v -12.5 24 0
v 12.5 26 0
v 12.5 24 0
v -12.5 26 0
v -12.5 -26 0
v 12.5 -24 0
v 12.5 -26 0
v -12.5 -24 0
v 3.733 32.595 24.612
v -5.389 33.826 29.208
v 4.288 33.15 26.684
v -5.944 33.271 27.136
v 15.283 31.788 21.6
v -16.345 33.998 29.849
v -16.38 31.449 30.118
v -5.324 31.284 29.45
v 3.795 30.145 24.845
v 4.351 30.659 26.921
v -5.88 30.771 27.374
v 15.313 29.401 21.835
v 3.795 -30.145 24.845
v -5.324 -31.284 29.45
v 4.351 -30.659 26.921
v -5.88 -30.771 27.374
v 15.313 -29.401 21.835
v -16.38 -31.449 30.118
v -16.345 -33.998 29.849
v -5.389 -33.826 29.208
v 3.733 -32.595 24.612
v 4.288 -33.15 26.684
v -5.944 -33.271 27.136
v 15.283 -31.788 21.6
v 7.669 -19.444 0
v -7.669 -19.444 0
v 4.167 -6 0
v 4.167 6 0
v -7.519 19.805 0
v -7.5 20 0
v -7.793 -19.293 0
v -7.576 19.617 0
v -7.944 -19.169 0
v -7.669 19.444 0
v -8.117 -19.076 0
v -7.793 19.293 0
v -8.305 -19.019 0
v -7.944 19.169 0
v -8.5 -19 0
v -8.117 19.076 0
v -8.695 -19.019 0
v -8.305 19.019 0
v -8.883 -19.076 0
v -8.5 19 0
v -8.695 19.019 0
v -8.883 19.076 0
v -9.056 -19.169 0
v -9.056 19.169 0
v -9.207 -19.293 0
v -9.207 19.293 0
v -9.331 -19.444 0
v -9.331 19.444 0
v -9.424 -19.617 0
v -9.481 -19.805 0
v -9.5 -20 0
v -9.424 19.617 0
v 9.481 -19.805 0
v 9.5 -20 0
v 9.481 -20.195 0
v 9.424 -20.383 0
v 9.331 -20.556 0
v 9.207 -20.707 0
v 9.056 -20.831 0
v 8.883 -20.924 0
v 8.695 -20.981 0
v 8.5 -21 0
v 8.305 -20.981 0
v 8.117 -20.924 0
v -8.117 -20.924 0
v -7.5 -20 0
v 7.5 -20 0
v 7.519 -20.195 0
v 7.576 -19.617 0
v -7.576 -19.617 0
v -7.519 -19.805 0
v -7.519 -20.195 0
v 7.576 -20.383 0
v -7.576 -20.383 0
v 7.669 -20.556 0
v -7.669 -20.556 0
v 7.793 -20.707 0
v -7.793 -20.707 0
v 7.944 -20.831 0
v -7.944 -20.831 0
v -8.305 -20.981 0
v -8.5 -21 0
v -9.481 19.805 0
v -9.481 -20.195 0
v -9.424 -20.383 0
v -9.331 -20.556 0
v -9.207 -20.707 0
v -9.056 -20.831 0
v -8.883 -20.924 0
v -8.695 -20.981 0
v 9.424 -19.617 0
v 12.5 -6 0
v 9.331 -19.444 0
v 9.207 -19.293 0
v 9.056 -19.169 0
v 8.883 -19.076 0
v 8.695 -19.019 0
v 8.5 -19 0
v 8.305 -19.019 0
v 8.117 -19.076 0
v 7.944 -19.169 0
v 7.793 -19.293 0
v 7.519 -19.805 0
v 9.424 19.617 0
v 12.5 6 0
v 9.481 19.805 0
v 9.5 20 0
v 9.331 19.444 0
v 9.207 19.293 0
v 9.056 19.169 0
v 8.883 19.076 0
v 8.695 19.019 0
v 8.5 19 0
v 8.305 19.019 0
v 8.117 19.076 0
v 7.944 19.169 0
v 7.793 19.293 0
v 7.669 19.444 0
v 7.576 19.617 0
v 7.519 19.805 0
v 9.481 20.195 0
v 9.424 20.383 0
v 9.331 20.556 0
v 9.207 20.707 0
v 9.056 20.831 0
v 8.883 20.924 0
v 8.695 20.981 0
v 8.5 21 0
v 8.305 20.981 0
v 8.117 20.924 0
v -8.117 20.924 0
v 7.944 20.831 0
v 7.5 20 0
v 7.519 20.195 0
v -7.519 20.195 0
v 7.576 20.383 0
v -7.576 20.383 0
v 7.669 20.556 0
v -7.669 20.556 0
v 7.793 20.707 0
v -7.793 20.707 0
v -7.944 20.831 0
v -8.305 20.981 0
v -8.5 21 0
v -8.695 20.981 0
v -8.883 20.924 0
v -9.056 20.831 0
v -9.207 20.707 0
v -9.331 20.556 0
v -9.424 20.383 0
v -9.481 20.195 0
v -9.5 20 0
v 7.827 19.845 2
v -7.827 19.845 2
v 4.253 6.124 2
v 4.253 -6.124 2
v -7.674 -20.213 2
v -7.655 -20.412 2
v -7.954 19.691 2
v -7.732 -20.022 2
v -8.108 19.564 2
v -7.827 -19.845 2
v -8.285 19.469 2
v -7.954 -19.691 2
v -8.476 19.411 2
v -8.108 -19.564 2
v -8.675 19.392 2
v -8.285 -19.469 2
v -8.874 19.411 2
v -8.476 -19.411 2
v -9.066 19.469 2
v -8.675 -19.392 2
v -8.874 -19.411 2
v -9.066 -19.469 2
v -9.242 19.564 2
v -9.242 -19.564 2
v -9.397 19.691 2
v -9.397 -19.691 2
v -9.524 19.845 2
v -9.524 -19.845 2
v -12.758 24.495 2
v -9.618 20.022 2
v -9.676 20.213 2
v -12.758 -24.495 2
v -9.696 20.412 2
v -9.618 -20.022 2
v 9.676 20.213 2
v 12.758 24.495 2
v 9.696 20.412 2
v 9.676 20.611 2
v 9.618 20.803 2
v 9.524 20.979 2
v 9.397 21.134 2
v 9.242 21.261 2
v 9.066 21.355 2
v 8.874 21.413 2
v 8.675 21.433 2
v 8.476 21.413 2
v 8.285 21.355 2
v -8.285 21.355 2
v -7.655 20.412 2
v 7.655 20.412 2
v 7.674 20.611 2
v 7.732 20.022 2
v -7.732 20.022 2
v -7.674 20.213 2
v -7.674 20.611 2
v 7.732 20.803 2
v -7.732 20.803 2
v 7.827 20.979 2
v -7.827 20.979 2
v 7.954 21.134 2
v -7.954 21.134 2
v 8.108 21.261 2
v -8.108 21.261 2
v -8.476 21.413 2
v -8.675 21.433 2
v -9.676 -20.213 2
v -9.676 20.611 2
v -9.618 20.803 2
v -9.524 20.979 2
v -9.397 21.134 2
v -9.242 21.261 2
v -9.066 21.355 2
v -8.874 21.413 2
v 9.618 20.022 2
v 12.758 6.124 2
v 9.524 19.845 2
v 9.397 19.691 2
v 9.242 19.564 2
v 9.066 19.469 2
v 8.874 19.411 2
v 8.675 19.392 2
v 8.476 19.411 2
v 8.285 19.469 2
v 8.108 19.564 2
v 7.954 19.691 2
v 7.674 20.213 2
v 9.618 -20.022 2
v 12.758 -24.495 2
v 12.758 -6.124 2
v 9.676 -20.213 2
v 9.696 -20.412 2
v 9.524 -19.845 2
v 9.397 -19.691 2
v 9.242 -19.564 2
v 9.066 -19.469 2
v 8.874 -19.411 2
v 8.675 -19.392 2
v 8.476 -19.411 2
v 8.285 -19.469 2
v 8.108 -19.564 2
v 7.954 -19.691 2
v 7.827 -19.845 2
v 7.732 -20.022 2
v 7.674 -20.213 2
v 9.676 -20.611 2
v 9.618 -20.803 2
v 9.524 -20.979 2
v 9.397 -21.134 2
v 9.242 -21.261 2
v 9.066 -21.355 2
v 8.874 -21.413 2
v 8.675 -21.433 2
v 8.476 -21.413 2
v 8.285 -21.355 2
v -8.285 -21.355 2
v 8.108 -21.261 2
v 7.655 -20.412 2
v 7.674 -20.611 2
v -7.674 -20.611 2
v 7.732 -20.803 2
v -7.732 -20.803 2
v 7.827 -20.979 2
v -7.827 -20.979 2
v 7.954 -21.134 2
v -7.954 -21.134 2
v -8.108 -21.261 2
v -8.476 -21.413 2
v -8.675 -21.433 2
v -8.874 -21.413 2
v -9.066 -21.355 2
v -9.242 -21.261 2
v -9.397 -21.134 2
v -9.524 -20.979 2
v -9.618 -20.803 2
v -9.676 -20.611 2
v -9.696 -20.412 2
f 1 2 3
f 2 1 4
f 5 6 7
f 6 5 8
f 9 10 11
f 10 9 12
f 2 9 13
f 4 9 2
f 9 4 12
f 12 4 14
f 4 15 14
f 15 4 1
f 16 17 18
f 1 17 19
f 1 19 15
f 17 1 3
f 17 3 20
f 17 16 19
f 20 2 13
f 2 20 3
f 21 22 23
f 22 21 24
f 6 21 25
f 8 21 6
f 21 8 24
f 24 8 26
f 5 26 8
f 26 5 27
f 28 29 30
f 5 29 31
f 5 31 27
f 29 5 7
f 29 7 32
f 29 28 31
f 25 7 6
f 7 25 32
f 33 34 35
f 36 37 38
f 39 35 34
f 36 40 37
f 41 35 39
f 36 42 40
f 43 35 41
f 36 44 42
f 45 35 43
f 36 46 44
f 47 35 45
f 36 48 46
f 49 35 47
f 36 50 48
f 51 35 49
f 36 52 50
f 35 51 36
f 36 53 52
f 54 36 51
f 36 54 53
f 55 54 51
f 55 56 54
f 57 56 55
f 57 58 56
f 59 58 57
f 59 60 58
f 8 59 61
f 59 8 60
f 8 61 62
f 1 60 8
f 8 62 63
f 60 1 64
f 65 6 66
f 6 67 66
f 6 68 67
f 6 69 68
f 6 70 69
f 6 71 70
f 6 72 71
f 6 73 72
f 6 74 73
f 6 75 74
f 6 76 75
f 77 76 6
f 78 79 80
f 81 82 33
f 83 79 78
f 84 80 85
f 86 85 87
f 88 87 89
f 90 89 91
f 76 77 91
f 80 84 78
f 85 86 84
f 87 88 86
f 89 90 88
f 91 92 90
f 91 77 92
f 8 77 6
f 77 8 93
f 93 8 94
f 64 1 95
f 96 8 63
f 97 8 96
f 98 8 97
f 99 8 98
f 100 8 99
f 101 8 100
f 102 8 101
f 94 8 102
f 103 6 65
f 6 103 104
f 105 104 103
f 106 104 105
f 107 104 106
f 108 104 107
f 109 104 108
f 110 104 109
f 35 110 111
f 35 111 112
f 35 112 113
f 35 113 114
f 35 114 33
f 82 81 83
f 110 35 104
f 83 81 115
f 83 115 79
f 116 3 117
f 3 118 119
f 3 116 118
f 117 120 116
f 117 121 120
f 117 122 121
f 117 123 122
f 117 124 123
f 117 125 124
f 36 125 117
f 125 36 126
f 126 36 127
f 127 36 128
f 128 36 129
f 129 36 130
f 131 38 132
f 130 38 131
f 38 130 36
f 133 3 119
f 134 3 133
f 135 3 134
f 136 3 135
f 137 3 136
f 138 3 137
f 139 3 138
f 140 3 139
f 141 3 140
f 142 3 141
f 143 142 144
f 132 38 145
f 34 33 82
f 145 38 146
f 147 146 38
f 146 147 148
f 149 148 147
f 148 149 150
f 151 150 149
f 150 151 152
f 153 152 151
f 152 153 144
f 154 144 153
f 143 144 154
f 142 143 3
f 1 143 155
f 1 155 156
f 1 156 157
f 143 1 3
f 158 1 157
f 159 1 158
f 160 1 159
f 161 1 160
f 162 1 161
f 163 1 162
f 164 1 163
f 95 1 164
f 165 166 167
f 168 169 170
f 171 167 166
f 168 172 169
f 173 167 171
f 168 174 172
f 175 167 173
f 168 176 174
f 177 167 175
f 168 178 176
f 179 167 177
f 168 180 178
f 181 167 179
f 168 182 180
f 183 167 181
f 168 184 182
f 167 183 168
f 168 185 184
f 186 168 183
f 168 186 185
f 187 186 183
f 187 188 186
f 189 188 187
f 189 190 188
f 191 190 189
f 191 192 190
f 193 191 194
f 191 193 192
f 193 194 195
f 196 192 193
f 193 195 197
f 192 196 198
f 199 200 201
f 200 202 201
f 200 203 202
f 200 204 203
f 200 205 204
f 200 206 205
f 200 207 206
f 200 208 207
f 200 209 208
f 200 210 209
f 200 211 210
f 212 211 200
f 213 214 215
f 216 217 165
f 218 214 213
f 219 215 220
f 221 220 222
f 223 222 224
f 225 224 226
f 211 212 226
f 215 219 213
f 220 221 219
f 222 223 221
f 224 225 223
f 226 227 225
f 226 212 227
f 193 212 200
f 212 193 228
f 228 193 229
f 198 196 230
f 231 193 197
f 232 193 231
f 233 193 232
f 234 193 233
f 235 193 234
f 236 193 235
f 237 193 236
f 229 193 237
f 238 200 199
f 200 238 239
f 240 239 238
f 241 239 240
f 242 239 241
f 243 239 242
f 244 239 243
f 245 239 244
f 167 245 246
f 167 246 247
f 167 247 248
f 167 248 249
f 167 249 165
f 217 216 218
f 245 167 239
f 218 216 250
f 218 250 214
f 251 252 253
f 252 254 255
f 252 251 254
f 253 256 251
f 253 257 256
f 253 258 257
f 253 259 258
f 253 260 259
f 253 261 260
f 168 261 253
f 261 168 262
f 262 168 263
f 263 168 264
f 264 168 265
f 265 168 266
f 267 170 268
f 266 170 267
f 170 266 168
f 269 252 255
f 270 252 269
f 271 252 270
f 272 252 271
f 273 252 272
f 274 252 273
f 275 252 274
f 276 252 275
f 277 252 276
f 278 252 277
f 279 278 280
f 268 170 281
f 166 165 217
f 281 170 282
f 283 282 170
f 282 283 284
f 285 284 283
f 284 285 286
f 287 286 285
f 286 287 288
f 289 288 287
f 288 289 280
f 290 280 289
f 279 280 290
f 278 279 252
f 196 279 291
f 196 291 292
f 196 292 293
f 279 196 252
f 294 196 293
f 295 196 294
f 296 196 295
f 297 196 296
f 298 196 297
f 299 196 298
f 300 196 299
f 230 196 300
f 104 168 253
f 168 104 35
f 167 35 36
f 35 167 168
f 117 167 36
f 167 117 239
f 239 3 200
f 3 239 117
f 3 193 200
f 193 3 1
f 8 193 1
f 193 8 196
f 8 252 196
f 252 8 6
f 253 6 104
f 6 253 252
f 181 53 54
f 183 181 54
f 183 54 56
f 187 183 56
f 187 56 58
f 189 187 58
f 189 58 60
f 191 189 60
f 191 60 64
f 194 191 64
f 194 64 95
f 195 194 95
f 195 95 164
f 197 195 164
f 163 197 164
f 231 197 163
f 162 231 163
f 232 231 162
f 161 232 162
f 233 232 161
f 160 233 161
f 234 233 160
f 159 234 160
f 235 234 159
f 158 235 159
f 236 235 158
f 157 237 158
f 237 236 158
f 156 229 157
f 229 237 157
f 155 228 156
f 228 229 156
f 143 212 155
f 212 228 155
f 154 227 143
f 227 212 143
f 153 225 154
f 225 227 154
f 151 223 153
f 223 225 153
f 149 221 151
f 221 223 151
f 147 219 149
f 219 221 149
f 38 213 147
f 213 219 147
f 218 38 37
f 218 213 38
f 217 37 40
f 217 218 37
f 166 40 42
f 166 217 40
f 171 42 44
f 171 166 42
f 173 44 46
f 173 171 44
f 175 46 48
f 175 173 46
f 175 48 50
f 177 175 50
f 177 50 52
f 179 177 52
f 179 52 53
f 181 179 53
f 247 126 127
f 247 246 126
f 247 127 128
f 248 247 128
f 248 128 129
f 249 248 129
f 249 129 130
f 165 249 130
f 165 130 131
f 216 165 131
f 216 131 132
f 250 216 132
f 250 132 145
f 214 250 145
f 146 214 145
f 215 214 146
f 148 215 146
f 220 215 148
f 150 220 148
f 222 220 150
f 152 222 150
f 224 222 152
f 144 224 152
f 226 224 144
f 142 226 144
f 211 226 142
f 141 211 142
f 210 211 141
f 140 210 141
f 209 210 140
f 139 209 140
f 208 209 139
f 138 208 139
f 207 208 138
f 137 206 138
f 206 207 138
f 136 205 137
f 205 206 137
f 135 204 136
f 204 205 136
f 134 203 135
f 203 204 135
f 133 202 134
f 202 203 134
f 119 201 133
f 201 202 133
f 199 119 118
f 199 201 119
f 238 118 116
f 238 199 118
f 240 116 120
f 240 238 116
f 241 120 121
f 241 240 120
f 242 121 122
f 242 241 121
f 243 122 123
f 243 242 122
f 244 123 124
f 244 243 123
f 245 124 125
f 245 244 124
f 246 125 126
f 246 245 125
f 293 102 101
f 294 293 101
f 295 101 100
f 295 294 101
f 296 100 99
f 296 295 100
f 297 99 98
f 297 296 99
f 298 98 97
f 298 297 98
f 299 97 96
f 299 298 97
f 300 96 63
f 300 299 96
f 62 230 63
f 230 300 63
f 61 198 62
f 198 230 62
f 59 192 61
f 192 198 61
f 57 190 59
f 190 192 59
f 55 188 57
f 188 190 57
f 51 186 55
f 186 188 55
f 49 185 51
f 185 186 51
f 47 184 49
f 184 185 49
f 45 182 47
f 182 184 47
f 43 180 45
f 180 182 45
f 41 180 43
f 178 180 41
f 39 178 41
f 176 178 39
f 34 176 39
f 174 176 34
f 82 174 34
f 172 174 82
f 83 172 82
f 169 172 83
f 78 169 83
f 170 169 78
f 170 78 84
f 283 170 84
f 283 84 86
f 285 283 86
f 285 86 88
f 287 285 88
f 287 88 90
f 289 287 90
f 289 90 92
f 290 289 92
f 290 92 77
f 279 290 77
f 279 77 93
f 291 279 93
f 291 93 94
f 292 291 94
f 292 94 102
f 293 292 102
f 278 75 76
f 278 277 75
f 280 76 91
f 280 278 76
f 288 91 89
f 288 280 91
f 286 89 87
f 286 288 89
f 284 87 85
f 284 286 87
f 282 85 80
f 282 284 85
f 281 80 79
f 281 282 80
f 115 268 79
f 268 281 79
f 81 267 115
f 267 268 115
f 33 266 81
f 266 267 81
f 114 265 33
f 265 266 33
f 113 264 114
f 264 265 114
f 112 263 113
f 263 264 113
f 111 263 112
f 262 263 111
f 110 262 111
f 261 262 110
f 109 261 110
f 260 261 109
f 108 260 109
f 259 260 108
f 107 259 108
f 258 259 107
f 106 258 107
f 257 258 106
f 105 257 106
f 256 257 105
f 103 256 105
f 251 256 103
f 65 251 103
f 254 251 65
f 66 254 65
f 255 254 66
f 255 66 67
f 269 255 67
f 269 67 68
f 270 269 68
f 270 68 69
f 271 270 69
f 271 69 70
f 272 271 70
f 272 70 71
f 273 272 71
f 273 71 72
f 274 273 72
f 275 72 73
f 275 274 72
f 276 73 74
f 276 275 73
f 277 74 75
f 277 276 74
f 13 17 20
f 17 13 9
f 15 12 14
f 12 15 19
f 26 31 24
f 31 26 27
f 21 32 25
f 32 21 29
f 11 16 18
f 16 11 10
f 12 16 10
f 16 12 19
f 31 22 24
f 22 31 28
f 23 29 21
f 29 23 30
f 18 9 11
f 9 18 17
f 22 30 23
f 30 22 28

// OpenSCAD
// file: oem/generic/lib.scad
$fn = 32;

kEpsilon = 1e-1;

function property(table, key) = table[search([key], table)[0]][1];

module sector(radius, angles, fn = $fn) {
     r = radius / cos(180 / fn);
     step = -360 / fn;

     points = concat([[0, 0]],
                     [for(a = [angles[0] : step : angles[1] - 360])
                               [r * cos(a), r * sin(a)]
                          ],
                     [[r * cos(angles[1]), r * sin(angles[1])]]
          );

     difference() {
          circle(radius, $fn = fn);
          polygon(points);
     }
}

module ring(inner_radius, outer_radius, angles = [0, 360], fn = $fn) {
     difference() {
          sector(radius=outer_radius, angles=angles, fn=fn);
          sector(radius=inner_radius, angles=angles+[-kEpsilon, kEpsilon], fn=fn);
     }
}

module rounded_ring(inner_radius, outer_radius, angles = [0, 360], fn = $fn) {
     step_angle = 360 / fn;
     ring_width = outer_radius - inner_radius;
     ring_mean_radius = (outer_radius + inner_radius) / 2;
     for (theta = angles) {
          theta_d = theta / step_angle;
          theta_frac = (theta_d - floor(theta_d) - 0.5) * step_angle;
          rho = ring_mean_radius * cos(step_angle/2) / cos(theta_frac);
          rotate(theta)
          translate([rho, 0])
          circle(d=ring_width);
     }
     ring(inner_radius=inner_radius,
          outer_radius=outer_radius,
          angles=angles, fn=fn);
}

module fillet(r) {
     difference() {
          difference() {
               offset(r=-r - kEpsilon)
                    offset(delta=r) {
                    children();
               }
               offset(r=r)
                    offset(delta=-r) {
                    children();
               }
          }
          children();
     }
     offset(r=r)
          offset(delta=-r) {
          children();
     }
}

module bench_fillet(r, order=1000) {
     difference() {
          fillet(r) {
               translate([-order/2-kEpsilon, 0]) {
                    square([order, order], center=true);
               }
               children();
          }
          translate([-order/2-kEpsilon, 0]) {
               square([order+kEpsilon, order+kEpsilon], center=true);
          }
     }
}

module curved_bench_fillet(r, bench_radius, order=1000, internal=true) {
     difference() {
          fillet(r) {
               if (internal) {
                    translate([bench_radius, 0]) {
                         ring(inner_radius=bench_radius + kEpsilon, outer_radius=bench_radius * order);
                    }
               } else {
                    translate([-bench_radius, 0]) circle(r=bench_radius - kEpsilon);
               }
               children();
          }
          if (internal) {
               translate([bench_radius, 0]) {
                    ring(inner_radius=bench_radius,
                         outer_radius=bench_radius * order - kEpsilon);
               }
          } else {
               translate([-bench_radius, 0]) circle(r=bench_radius);
          }

     }
}


module window(side, position=[0, 0, 0], order=1000) {
    difference() {
        children();
        translate(position)  {
            difference() {
                square(order, center=true);
                square(side, center=true);
            }
        }
    }
}


module rounded_cylinder(diameter, height, fillet_radius, center) {
     translate([0, 0, ! center ? height/2 : 0]) {
          minkowski() {
               cylinder(d=(diameter - 2 * fillet_radius),
                        h=(height - 2 * fillet_radius),
                        center=true);
               sphere(r=fillet_radius);
          }
     }
}


module curved_support_xsection(support_radius, fillet_radius,
                               wall_inner_radius, wall_outer_radius,
                               hole_radius = 0, internal=true) {
     support_angular_width = (4 * support_radius / wall_outer_radius) * 180 / PI;
     wall_thickness = wall_outer_radius - wall_inner_radius;
     rotate([0, 0, internal ? 180 : 0]) {
          difference() {
               window(6*support_radius) {
                    curved_bench_fillet(fillet_radius, bench_radius=wall_inner_radius, internal=internal) {
                         hull() {
                              translate([support_radius + wall_thickness/2, 0]) {
                                   circle(r=support_radius);
                              }
                              rotate([0, 0, ! internal ? 180 : 0])
                              translate([wall_inner_radius + wall_thickness/2, 0]) {
                                   ring(inner_radius=wall_inner_radius,
                                        outer_radius=wall_outer_radius,
                                        angles=[180 - support_angular_width/2,
                                                180 + support_angular_width/2]);
                              }
                         }
                         rotate([0, 0, ! internal ? 180 : 0])
                         translate([wall_inner_radius + wall_thickness/2, 0]) {
                              ring(inner_radius=wall_inner_radius,
                                   outer_radius=wall_outer_radius,
                                   angles=[180 - support_angular_width,
                                           180 + support_angular_width]);
                         }
                    }
               }
               if (hole_radius > 0) {
                    translate([support_radius + wall_thickness/2, 0]) {
                         circle(r=hole_radius);
                    }
               }
          }
     }
}

module fill(upto=1000) {
     offset(delta=-upto) {
          offset(delta=upto) {
               children();
          }
     }
}

module outline(delta) {
     if (delta > 0) {
          difference() {
               offset(delta=delta) {
                    children();
               }
               children();
          }
     } else {
          difference() {
               children();
               offset(delta=delta) {
                    children();
               }
          }
     }
}

module duplicate(v) {
     children();
     mirror(v) children();
}

function steps(start, end, n) = [start:(end - start)/(n - 1):end];

function sigmoid(x) = 1.0 / (1.0 + exp(-x));

module sigmoid_profile(length, width, order=10, fn = $fn) {
     step = length / fn;
     points = concat(
          [[0, 0]],
          [for (x = [step:step:length-step]) [x, width * sigmoid(2 * order * ((x / length) - 0.5))]],
          [[length, width], [0, width]]

     );
     polygon(points=points);
}

module exp_nerve_xsection(height, length, decay_rate = 5, fn = $fn) {
     step = length / fn;
     points = concat(
          [[0, 0]],
          [for (x = [0:step:length-step]) [x, height * exp(-x/decay_rate)]],
          [[length, 0]]
          );
     polygon(points=points);
}

module exp_nerve(height, length, thickness, decay_rate = 3, fn = $fn) {
     rotate([90, 0, 0])
     linear_extrude(height=thickness, center=true) {
          exp_nerve_xsection(height, length, decay_rate, fn);
     }
}

module exp_corner_nerve(height, radius, angles, corner_radius = 0, decay_rate = 3, fn = $fn) {
     difference() {
          rotate_extrude() {
               if (corner_radius > 0) {
                    translate([corner_radius, 0, 0])
                    exp_nerve_xsection(height=height, length=radius, decay_rate=decay_rate, fn=fn);
               } else {
                    translate([-corner_radius, 0, 0])
                    mirror([1, 0, 0])
                    exp_nerve_xsection(height=height, length=radius, decay_rate=decay_rate, fn=fn);
               }
          }
          linear_extrude(height=2 * height, center=true) {
               sector(radius=radius + abs(corner_radius), angles=[angles[1], angles[0] + 360], fn=fn);
          }
     }
}
// file: chassis_base.scad
include <generic/lib.scad>;

function vChassisBaseDatasheet() =
     let(outer_diameter=400, thickness=2, inner_diameter=outer_diameter - 2 * thickness,
         base_height=108, height=130, inner_height=height - 2 * thickness)
     [["outer_diameter", outer_diameter], ["inner_diameter", inner_diameter],
      ["base_height", base_height], ["height", height], ["inner_height", inner_height],
      ["thickness", thickness], ["support_diameter", 10], ["z_offset", 20], ["fillet_radius", 4]];

module mChassisOuterVolume() {
     datasheet = vChassisBaseDatasheet();
     rounded_cylinder(diameter=property(datasheet, "outer_diameter"),
                      height=property(datasheet, "height"),
                      fillet_radius=property(datasheet, "fillet_radius"));
}

module mChassisInnerVolume() {
     datasheet = vChassisBaseDatasheet();
     translate([0, 0, property(datasheet, "thickness")]) {
          rounded_cylinder(diameter=property(datasheet, "inner_diameter"),
                           height=property(datasheet, "inner_height"),
                           fillet_radius=property(datasheet, "fillet_radius"));
     }
}

module mChassisBBox() {
     datasheet = vChassisBaseDatasheet();
     chassis_height = property(datasheet, "height");
     chassis_outer_diameter = property(datasheet, "outer_diameter");
     translate([0., 0., chassis_height/2]) {
          cube([chassis_outer_diameter, chassis_outer_diameter, chassis_height], center=true);
     }
}

module mChassisShell() {
     difference() {
          mChassisOuterVolume();
          mChassisInnerVolume();
     }
}

module mChassisVolumeConstrain() {
     datasheet = vChassisBaseDatasheet();
     height = property(datasheet, "height");
     outer_diameter = property(datasheet, "outer_diameter");
     fillet_radius = property(datasheet, "fillet_radius");
     difference() {
          rounded_cylinder(diameter=outer_diameter,
                           height=height,
                           fillet_radius=fillet_radius);
          difference() {
               translate([0, 0, -kEpsilon]) {
                    rounded_cylinder(diameter=outer_diameter + kEpsilon,
                                     height=height + 2 * kEpsilon,
                                     fillet_radius=fillet_radius);
               }
               children();
          }
     }
}
// file: oem/hcs04_sonar.scad
include <generic/lib.scad>;

function vHCS04SonarDatasheet() =
     [["horizontal_fov", 30], ["range", 4000], ["width", 43],
      ["length", 20], ["height", 15], ["hole_to_hole_width", 40],
      ["hole_to_hole_length", 17], ["hole_diameter", 2]];

module mHCS04SonarFrustum() {
     datasheet = vHCS04SonarDatasheet();
     sonar_length = property(datasheet, "length");
     sonar_width = property(datasheet, "width");
     sonar_range = property(datasheet, "range");
     sonar_horizontal_fov = property(datasheet, "horizontal_fov");
     linear_extrude(height=sonar_range, scale=(2 * sonar_range * tan(sonar_horizontal_fov/2) + sonar_width)/sonar_width) {
          square([sonar_length, sonar_width], center=true);
     }
}

module mHCS04Sonar() {
     rotate([0, 0, 90]) import("stl/HC-SR04.stl");
}

mHCS04Sonar();
// main file
include <generic/lib.scad>;

use <oem/hcs04_sonar.scad>;

use <chassis_base.scad>;

kHCS04SonarDatasheet = vHCS04SonarDatasheet();
kChassisBaseDatasheet = vChassisBaseDatasheet();

function vHCS04SonarBracketDatasheet() =
     [["width", property(kHCS04SonarDatasheet, "width") + 5],
      ["length", property(kHCS04SonarDatasheet, "length") + 5],
      ["connector_width", 12], ["pin_width", 10],
      ["thickness", 2], ["mounting_polar_angle", 75],
      ["distance_to_wall", 2 * property(kHCS04SonarDatasheet, "height")]];


module mHCS04SonarBracket() {
     datasheet = vHCS04SonarBracketDatasheet();
     width = property(datasheet, "width");
     pin_width = property(datasheet, "pin_width");
     length = property(datasheet, "length");
     thickness = property(datasheet, "thickness");
     mounting_polar_angle = property(datasheet, "mounting_polar_angle");
     distance_to_wall = property(datasheet, "distance_to_wall");
     sonar_horizontal_fov = property(kHCS04SonarDatasheet, "horizontal_fov");
     sonar_hole_to_hole_width = property(kHCS04SonarDatasheet, "hole_to_hole_width");
     sonar_hole_to_hole_length = property(kHCS04SonarDatasheet, "hole_to_hole_length");
     sonar_hole_diameter = property(kHCS04SonarDatasheet, "hole_diameter");
     render(convexity = 10) {
          rotate([0, -mounting_polar_angle, 0])
          difference() {
               rotate([0, mounting_polar_angle, 0]) {
                    let(extrusion_scale=(4 * distance_to_wall * tan(sonar_horizontal_fov/2) + width  + 2 * thickness)/(width + 2 * thickness)) {
                         linear_extrude(height=2 * distance_to_wall, scale=extrusion_scale) {
                              difference() {
                                   square([length, width + 2 * thickness], center=true);
                                   square([length + kEpsilon, width], center=true);
                              }
                         }
                    }
                    let(extrusion_scale=(2 * thickness * tan(sonar_horizontal_fov/2) + width  + 2 * thickness)/(width + 2 * thickness)) {
                         linear_extrude(height=thickness, scale=extrusion_scale) {
                              difference() {
                                   square([length, width], center=true);
                                   for (x = [-sonar_hole_to_hole_length/2, sonar_hole_to_hole_length/2]) {
                                        for (y = [-sonar_hole_to_hole_width/2, sonar_hole_to_hole_width/2]) {
                                             translate([x, y, 0]) circle(d=sonar_hole_diameter);
                                        }
                                   }
                                   translate([length/2 - length/6, 0]) {
                                        square([length/3, property(datasheet, "connector_width")], center=true);
                                   }
                              }
                         }
                    }
               }
               let(chassis_height=property(kChassisBaseDatasheet, "height"),
                   chassis_outer_diameter=property(kChassisBaseDatasheet, "outer_diameter"),
                   chassis_inner_diameter=property(kChassisBaseDatasheet, "inner_diameter"),
                   chassis_thickness=property(kChassisBaseDatasheet, "thickness")) {
                    translate([distance_to_wall, 0, 0]) {
                         difference() {
                              cube(chassis_height, center=true);
                              translate([-chassis_outer_diameter/2, 0, 0]) {
                                   cylinder(d=chassis_inner_diameter - kEpsilon, h=chassis_height + kEpsilon, center=true);
                                   translate([0, 0, distance_to_wall * sin(90 - mounting_polar_angle)]) {
                                        cylinder(d=chassis_outer_diameter + 3 * kEpsilon, h=pin_width, center=true);
                                   }
                              }
                         }
                    }
               }
          }
     }
}

mHCS04SonarBracket();
